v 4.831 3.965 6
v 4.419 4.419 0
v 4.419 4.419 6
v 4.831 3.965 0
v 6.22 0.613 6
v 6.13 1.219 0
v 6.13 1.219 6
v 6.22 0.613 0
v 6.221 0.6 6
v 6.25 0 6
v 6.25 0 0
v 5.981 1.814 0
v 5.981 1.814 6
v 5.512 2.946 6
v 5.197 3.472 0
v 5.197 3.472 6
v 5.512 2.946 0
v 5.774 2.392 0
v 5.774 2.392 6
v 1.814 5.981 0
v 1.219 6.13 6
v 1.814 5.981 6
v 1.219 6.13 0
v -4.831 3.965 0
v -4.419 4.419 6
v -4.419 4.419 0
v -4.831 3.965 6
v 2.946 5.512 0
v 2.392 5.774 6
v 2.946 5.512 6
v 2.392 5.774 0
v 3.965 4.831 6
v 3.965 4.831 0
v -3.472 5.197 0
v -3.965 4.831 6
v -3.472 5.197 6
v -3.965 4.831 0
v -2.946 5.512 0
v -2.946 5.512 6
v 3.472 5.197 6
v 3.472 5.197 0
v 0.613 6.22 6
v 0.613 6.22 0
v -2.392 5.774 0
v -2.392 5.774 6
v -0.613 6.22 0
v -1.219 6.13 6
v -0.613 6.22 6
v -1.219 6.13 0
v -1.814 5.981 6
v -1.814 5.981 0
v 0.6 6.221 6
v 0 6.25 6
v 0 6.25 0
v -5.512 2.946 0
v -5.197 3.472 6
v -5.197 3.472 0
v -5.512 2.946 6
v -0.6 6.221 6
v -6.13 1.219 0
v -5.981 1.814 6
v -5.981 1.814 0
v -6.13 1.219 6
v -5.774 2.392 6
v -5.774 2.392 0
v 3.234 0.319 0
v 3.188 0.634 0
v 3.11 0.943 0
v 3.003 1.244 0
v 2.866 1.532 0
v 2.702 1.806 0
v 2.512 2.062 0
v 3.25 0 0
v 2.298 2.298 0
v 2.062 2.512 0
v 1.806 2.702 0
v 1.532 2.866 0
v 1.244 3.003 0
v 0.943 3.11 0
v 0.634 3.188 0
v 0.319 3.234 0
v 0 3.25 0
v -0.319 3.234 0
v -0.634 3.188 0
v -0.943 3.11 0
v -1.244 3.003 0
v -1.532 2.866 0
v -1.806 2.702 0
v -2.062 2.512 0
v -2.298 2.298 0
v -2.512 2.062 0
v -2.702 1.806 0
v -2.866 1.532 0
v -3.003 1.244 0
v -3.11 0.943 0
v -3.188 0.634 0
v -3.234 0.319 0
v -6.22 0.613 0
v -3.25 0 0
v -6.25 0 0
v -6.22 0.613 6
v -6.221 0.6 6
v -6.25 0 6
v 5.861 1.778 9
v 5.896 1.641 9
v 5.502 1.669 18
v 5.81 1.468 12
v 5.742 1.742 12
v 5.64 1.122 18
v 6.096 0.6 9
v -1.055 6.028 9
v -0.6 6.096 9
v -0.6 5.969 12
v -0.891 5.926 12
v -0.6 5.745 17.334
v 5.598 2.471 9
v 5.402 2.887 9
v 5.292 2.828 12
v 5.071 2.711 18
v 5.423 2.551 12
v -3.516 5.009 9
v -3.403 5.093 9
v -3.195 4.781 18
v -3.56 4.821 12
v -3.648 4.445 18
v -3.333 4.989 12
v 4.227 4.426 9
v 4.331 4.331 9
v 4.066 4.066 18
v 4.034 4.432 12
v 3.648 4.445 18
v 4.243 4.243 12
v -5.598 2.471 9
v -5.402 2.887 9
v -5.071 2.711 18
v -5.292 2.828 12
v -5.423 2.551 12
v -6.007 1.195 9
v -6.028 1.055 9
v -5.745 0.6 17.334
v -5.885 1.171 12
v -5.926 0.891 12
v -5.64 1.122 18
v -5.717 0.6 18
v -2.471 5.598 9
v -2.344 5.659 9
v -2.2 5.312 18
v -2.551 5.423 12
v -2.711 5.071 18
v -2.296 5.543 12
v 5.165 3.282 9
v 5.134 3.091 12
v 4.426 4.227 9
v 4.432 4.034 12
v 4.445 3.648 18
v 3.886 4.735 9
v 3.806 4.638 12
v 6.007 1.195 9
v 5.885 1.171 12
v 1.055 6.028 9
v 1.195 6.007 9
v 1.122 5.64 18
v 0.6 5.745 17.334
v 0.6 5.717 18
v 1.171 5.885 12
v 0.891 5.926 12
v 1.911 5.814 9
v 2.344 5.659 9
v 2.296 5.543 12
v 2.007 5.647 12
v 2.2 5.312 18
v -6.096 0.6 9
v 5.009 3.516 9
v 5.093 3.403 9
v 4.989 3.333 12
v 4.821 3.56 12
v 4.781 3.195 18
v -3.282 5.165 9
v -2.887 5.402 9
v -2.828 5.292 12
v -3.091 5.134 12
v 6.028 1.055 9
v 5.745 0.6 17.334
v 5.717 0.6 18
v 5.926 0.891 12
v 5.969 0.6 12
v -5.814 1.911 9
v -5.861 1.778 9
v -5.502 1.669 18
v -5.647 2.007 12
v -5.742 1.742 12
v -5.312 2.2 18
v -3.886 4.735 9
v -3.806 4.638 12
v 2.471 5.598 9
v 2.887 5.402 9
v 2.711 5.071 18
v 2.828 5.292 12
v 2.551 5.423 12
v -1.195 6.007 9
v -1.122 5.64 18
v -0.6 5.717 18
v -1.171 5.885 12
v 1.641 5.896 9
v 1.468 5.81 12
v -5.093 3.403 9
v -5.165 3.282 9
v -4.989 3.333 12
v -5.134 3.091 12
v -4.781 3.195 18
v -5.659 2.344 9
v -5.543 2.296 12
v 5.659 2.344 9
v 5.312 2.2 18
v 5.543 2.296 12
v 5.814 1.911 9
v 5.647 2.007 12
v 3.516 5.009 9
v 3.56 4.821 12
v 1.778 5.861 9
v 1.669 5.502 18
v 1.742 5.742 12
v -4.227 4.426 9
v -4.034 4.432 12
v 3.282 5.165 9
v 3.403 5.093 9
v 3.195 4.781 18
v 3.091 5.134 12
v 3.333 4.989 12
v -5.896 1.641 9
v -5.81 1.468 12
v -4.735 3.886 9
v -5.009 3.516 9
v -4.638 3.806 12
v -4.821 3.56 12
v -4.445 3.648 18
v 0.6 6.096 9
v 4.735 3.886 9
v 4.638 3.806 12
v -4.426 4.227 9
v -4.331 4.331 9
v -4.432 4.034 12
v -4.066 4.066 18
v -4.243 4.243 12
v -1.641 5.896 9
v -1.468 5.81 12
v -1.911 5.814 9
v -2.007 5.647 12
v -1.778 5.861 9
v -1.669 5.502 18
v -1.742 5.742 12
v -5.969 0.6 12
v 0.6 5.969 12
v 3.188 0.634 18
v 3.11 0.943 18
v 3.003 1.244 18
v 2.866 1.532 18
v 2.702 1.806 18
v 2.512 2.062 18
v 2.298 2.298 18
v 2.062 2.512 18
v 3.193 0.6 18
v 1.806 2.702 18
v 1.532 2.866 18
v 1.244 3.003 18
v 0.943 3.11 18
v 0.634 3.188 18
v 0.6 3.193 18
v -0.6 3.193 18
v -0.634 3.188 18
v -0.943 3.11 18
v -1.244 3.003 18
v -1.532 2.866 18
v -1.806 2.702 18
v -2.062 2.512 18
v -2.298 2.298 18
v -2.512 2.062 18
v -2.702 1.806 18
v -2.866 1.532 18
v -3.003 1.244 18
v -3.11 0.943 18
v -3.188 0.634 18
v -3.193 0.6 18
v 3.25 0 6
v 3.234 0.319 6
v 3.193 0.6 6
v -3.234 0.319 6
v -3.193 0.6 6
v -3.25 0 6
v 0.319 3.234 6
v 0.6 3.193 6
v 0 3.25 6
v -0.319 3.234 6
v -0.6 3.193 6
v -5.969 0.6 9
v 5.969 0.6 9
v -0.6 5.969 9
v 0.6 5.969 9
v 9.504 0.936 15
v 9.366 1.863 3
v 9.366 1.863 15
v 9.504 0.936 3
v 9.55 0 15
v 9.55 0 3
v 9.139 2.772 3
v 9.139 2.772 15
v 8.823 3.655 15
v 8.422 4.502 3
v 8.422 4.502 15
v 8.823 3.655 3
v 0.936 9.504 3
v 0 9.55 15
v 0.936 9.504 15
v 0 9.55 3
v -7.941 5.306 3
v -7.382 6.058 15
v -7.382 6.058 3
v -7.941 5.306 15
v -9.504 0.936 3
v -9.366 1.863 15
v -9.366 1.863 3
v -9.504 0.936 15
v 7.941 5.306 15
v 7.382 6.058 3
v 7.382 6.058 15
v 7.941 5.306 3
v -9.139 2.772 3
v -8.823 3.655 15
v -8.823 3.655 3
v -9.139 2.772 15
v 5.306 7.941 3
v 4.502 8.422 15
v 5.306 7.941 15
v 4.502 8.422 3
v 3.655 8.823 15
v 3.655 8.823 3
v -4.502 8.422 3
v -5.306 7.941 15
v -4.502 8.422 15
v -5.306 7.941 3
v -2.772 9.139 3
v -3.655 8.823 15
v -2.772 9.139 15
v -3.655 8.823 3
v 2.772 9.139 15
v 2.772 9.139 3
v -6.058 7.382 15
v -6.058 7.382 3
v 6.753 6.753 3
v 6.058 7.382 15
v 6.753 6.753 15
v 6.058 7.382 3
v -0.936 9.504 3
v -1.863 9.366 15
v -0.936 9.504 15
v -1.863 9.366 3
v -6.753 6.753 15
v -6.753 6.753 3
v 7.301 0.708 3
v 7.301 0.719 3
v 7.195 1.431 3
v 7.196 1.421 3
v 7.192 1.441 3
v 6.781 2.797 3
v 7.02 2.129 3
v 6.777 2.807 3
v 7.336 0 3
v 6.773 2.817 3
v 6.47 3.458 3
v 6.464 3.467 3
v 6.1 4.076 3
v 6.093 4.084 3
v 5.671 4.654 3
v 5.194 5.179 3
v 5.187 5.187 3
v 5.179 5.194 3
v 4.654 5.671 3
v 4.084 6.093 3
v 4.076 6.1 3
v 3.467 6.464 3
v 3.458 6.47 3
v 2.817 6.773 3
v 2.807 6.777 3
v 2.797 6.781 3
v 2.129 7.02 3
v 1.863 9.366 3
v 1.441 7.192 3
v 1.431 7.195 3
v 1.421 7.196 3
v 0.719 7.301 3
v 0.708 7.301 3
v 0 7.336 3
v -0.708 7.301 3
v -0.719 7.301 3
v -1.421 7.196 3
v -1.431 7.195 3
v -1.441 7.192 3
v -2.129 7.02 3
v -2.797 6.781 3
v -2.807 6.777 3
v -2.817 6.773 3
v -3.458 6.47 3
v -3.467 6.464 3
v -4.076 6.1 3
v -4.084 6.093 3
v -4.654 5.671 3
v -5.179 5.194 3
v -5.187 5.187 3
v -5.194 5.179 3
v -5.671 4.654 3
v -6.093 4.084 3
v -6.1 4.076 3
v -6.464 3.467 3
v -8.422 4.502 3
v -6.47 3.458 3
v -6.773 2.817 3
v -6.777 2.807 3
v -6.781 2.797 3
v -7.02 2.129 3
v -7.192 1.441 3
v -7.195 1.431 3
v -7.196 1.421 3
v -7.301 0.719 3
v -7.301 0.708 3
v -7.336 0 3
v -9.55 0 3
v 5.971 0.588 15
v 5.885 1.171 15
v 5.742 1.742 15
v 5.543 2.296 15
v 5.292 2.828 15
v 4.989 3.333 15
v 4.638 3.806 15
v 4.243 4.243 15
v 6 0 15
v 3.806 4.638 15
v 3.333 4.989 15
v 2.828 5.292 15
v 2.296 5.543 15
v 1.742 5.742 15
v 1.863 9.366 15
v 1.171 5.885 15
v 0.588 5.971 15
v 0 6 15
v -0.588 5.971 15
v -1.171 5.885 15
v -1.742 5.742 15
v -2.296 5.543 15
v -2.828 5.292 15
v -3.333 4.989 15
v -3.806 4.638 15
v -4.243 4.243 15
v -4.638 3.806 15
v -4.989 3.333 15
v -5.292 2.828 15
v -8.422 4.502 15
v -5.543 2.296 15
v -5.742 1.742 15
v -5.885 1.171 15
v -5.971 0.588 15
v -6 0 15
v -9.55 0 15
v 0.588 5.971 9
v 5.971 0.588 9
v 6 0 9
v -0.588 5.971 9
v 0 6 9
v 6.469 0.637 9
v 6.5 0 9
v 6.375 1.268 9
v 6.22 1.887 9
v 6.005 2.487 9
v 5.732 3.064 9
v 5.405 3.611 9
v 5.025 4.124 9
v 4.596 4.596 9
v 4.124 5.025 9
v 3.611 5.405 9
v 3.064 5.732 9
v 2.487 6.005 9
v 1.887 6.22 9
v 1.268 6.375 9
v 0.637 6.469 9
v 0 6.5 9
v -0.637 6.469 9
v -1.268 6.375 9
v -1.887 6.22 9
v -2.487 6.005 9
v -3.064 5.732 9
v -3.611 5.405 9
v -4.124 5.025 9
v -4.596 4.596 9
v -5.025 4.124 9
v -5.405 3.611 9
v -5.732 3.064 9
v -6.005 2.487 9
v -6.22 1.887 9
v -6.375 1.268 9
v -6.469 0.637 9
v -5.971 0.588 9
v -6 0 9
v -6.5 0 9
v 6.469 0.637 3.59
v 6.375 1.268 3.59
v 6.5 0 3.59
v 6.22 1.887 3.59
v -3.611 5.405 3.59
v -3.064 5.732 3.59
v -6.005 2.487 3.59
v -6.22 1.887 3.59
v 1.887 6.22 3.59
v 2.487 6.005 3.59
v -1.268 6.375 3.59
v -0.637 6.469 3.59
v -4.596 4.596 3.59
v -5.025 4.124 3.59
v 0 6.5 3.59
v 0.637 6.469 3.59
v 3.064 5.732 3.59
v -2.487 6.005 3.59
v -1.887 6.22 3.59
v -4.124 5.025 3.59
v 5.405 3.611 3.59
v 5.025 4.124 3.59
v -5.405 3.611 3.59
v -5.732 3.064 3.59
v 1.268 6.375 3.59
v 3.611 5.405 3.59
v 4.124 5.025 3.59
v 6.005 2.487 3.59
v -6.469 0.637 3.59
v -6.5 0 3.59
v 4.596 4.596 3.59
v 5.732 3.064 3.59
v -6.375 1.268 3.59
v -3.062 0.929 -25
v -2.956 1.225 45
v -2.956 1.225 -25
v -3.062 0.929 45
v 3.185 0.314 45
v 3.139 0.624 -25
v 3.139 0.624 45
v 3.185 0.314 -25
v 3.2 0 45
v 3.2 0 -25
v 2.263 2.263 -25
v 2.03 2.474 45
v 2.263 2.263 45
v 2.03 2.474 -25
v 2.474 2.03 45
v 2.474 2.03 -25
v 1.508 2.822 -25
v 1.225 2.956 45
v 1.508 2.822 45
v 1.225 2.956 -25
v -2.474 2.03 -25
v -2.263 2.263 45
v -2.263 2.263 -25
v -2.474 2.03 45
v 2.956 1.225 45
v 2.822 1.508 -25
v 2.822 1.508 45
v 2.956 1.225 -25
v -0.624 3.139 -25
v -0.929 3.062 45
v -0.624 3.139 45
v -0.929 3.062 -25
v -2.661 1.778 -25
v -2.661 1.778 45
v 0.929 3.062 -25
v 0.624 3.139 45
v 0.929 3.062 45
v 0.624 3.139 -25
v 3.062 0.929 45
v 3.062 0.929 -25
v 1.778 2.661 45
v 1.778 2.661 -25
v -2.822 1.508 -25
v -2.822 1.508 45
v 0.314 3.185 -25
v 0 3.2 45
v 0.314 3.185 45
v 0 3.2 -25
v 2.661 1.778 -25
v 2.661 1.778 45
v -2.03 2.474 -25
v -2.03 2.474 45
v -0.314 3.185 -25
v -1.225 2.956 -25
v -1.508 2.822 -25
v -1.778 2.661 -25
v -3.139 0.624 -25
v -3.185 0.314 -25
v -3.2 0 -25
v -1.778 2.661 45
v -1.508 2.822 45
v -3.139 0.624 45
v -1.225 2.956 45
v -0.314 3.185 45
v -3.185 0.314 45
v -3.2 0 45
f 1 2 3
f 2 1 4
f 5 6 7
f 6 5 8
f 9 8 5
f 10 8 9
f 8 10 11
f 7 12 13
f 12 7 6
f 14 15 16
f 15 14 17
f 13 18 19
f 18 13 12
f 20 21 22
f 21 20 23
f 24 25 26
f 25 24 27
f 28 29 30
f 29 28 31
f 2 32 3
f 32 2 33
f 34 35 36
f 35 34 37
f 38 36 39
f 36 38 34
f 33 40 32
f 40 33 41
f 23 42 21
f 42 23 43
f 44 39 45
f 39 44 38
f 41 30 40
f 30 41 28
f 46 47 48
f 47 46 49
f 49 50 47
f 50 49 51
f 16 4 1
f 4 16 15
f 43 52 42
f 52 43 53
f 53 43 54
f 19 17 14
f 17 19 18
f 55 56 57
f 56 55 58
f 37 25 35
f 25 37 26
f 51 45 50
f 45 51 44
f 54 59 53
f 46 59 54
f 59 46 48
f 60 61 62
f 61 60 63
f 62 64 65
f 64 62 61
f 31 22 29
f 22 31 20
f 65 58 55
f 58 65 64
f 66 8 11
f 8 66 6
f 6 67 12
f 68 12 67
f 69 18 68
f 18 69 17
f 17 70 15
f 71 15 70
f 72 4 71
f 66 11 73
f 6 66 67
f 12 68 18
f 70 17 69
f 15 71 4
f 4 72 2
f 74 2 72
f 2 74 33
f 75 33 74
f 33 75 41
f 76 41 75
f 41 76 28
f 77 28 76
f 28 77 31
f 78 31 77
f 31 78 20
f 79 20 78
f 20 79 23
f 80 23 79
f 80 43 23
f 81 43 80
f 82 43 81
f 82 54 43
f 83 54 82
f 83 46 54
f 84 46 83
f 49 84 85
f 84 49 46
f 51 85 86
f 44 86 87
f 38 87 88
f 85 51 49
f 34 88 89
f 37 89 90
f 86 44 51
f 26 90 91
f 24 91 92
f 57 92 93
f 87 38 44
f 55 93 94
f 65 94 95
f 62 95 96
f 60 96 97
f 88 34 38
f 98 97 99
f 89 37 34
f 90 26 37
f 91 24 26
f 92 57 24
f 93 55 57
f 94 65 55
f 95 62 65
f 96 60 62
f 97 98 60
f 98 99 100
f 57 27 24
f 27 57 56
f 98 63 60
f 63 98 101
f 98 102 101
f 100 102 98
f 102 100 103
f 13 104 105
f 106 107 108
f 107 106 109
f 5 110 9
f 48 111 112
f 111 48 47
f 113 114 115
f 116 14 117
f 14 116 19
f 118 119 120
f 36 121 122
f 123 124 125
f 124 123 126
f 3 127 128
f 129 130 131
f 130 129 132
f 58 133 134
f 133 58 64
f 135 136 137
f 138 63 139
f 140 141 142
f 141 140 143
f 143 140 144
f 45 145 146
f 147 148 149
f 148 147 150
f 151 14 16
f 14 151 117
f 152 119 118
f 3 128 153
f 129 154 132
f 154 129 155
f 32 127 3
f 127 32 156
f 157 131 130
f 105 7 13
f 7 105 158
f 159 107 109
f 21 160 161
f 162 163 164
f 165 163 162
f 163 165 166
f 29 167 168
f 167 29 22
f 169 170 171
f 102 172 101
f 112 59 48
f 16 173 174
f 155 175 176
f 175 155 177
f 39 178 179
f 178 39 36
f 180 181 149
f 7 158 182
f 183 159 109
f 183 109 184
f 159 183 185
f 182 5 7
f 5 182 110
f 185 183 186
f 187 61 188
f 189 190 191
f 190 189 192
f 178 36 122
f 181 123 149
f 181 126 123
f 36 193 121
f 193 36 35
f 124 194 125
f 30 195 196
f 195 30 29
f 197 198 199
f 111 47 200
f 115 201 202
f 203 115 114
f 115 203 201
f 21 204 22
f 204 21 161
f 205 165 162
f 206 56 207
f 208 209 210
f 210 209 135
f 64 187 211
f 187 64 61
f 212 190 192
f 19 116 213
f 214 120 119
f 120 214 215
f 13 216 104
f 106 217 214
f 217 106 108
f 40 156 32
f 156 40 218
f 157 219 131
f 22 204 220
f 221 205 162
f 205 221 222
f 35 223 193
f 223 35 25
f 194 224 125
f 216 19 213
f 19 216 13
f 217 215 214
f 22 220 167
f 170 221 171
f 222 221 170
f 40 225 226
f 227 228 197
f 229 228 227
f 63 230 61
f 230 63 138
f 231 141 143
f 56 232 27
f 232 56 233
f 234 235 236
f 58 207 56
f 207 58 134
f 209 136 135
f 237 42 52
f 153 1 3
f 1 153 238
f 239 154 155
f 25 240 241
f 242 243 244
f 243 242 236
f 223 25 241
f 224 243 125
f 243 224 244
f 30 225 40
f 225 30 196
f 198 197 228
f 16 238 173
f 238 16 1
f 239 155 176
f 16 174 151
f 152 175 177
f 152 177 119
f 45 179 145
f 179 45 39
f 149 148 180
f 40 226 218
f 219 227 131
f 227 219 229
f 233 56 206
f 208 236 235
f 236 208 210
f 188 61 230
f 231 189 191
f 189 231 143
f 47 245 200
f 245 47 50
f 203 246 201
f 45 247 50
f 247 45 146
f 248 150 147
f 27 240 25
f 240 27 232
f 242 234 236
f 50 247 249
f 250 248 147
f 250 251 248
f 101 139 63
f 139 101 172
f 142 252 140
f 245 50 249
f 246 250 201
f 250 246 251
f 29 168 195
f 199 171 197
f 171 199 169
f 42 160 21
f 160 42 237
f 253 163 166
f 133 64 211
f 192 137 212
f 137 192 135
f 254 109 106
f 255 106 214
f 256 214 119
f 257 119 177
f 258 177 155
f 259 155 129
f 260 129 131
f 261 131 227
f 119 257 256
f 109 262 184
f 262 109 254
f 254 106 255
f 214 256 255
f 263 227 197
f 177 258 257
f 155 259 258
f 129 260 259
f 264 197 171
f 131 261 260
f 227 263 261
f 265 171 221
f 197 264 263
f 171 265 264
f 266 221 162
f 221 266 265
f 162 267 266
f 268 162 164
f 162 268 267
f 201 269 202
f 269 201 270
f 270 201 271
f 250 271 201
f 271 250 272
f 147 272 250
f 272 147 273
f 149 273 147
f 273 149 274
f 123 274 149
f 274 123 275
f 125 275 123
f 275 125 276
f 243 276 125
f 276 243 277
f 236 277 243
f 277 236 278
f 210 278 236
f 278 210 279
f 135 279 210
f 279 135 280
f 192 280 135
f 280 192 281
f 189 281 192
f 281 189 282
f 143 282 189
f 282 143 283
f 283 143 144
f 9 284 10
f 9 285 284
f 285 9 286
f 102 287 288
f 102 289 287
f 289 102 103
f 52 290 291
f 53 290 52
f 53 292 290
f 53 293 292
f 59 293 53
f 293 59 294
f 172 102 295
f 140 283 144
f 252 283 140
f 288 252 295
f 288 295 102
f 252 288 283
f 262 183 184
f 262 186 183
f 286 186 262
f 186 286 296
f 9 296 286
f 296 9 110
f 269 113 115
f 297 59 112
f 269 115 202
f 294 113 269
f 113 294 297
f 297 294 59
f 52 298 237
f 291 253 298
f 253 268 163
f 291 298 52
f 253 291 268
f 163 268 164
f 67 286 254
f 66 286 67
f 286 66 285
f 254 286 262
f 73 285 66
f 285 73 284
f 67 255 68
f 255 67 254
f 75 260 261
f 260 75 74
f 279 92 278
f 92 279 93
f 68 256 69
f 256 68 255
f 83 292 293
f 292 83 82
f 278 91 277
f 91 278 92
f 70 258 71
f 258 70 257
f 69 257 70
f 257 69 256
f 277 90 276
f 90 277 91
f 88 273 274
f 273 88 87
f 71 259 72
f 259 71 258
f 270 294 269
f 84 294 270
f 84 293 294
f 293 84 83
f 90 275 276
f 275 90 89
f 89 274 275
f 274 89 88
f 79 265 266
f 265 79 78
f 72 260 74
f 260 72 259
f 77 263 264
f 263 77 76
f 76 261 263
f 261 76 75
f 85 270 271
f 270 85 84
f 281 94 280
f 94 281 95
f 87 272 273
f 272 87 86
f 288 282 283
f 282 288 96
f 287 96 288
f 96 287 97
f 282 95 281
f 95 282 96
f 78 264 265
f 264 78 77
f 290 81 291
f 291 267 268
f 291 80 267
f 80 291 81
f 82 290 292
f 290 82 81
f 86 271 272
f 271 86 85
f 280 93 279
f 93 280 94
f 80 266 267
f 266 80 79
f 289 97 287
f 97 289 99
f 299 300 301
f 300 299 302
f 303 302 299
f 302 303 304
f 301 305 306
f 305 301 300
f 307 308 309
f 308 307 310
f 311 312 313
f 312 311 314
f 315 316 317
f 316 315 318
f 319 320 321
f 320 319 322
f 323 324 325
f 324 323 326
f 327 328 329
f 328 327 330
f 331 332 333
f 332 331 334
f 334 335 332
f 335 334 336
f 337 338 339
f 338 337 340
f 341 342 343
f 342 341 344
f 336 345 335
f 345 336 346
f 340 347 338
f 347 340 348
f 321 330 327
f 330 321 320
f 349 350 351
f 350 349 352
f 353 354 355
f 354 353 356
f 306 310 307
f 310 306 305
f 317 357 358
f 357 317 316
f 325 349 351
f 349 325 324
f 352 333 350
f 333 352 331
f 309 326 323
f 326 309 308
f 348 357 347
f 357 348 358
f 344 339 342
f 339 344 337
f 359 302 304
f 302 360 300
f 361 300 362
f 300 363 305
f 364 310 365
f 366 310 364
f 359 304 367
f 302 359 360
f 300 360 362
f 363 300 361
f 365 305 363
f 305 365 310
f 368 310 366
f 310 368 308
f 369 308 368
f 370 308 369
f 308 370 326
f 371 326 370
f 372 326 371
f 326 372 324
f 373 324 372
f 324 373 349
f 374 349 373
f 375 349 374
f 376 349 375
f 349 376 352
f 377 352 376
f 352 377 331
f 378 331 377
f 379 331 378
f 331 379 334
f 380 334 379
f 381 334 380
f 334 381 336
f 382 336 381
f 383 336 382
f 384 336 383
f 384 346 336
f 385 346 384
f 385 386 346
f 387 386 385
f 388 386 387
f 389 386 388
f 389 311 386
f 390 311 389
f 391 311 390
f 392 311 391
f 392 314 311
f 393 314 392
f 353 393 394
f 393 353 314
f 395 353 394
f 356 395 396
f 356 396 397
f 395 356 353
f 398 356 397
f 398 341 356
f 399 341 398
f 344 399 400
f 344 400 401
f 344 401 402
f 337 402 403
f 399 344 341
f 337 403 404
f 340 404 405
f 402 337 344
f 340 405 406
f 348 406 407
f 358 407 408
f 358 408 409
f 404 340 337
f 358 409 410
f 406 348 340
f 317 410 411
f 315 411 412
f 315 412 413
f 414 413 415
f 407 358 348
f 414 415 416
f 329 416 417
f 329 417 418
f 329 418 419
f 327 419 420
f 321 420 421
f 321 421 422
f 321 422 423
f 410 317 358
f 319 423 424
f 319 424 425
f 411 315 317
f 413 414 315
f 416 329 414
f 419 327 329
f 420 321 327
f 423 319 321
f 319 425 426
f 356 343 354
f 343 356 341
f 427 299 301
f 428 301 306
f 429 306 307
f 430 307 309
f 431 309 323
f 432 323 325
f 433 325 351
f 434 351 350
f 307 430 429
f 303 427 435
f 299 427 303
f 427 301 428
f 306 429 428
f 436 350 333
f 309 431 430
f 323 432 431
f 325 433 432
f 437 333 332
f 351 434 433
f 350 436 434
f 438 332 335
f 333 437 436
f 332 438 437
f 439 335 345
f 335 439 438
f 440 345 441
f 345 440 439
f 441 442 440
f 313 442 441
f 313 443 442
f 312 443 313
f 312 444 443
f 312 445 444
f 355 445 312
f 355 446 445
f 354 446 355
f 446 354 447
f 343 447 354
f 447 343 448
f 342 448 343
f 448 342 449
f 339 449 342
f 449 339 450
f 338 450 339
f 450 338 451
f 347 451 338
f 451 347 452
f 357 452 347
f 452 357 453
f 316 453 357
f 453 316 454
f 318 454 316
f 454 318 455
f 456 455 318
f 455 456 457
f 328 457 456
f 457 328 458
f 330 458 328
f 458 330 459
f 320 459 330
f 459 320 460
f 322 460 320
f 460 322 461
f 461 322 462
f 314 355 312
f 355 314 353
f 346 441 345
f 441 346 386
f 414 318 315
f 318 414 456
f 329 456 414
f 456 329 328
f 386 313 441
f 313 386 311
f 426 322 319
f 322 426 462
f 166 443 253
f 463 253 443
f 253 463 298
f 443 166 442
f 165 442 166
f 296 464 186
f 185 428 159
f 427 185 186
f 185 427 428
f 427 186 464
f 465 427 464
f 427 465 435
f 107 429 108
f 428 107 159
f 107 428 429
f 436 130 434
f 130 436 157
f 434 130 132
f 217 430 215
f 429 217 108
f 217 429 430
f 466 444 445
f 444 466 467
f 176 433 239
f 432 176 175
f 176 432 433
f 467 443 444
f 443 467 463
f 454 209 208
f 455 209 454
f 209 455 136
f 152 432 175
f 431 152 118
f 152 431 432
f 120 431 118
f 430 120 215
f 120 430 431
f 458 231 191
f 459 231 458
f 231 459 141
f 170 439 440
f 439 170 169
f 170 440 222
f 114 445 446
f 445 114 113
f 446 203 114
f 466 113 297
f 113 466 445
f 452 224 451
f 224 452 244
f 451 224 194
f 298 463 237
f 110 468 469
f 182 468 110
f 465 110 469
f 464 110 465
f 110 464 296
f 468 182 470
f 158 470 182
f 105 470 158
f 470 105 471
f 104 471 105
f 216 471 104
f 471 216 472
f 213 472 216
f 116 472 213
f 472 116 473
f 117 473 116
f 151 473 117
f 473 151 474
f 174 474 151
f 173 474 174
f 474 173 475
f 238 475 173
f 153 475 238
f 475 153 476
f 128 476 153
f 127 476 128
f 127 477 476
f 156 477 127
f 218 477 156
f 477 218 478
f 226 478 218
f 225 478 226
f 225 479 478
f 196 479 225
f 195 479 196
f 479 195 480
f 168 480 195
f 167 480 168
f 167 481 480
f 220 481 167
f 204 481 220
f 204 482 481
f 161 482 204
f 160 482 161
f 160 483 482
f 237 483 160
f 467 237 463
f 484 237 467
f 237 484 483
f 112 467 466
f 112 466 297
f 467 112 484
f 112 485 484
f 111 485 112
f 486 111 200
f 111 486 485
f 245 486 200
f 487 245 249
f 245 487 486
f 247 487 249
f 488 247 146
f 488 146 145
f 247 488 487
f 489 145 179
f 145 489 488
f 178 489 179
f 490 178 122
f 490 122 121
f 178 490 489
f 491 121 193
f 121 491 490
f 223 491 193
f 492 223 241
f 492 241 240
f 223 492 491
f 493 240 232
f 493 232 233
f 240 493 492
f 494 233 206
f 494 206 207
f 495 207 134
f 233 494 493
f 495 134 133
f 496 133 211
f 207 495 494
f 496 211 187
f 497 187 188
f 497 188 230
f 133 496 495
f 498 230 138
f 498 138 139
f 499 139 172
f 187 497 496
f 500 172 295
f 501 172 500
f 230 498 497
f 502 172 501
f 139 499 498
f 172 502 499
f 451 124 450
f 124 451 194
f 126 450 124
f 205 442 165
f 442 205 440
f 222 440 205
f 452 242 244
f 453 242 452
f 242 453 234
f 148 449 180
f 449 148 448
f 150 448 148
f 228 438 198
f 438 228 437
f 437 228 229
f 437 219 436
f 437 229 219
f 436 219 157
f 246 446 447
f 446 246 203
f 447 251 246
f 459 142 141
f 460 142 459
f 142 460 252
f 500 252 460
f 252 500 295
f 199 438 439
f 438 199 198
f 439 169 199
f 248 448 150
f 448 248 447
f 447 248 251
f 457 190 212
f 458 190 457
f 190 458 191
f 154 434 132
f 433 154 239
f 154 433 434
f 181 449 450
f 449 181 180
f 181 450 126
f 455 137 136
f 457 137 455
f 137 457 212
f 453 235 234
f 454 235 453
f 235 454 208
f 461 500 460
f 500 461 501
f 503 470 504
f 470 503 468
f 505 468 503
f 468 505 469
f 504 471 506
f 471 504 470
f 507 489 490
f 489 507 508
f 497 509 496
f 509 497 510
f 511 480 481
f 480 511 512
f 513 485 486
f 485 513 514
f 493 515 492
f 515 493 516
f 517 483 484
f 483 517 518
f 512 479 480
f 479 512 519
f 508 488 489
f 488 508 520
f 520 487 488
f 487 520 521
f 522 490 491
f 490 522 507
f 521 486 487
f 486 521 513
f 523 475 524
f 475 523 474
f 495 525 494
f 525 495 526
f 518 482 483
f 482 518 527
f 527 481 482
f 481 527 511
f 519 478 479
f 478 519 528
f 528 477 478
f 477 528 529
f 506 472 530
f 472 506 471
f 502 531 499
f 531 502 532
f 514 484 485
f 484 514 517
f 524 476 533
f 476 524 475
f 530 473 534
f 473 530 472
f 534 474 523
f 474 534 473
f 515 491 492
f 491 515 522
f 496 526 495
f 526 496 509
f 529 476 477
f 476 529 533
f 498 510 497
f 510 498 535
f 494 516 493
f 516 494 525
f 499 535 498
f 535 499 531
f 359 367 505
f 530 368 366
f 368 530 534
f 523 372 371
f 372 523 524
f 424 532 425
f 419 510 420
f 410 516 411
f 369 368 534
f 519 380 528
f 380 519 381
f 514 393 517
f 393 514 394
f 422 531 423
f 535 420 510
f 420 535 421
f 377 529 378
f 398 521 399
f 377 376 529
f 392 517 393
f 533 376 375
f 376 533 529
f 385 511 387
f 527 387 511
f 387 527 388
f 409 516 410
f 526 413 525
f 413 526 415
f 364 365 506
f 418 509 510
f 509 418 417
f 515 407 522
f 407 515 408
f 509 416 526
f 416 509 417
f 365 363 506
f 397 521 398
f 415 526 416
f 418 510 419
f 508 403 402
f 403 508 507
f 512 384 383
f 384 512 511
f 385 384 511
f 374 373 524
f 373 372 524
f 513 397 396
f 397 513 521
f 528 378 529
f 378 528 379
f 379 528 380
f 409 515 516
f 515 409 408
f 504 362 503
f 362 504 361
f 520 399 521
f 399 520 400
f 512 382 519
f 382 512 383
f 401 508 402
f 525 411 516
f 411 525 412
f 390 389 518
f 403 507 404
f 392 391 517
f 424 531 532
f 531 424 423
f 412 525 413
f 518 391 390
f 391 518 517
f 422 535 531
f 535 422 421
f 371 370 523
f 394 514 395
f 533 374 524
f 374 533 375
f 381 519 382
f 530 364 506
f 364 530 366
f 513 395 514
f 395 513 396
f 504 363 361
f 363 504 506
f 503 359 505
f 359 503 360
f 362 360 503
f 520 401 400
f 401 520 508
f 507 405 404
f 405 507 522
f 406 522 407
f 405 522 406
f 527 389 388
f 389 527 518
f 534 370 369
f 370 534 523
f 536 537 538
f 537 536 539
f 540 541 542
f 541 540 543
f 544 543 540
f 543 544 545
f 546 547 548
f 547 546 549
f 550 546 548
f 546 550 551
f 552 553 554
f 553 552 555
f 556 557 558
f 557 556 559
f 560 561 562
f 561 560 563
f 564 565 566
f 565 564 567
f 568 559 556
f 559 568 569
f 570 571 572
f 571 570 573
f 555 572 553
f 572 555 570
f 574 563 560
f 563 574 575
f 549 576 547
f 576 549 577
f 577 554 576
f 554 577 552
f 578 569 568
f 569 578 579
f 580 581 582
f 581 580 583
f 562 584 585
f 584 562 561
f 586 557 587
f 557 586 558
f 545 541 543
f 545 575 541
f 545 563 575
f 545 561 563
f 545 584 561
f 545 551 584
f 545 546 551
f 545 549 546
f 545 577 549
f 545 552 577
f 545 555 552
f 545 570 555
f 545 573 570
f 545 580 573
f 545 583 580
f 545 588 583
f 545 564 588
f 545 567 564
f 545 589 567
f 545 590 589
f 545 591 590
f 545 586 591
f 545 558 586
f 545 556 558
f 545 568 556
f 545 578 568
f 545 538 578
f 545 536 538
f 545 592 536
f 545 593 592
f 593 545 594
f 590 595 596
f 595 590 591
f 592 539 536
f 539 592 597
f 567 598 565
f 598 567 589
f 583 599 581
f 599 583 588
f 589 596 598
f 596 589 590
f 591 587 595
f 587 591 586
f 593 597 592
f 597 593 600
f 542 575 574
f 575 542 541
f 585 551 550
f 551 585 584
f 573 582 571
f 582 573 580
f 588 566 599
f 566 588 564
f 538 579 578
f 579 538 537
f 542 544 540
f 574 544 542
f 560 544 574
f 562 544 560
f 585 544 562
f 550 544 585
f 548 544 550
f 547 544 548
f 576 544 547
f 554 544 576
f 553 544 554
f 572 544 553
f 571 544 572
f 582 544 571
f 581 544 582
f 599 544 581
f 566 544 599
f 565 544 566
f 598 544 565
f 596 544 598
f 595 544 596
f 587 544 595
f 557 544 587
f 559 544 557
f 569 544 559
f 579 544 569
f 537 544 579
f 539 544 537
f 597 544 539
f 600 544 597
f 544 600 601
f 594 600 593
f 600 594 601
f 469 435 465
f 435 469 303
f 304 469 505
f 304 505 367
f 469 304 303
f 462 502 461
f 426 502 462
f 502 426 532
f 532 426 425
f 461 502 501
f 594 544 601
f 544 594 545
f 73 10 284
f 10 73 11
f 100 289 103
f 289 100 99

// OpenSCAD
// Siphon strainer -- 1/4" tubing adapter, THREADED version
// Collet + collar. Screwing the collar on draws it down the finger taper and
// squeezes the fingers onto the tubing; backing it off releases them.
//
// Layout (radii, all relative to the collet axis):
//
//   collet  z 0..6    solid cylindrical section carrying the external thread
//           z 6..18   four fingers, tapering 12.5 -> 11.5 dia
//   collar  z 0..6    internal thread (crest 12.9) -> clears the fingers
//           z 6..12   squeeze bore (12.0) -> smaller than the finger base
//
// The step between those two bores is what makes it work: the thread has to
// clear the fingers (else the collar binds on the way off), while the squeeze
// bore has to be under the finger diameter (else it never grips).
//
// Travel: 6 mm of thread (3 turns at 2 mm pitch) takes the squeeze bore from
// zero interference at z=12 to 0.25 mm radial at the finger base.

$fn = 64;

// ---- grip class (edit this) ----
tube_bore = 6.50;          // nominal tubing OD is 6.35

// Collet
clamp_length = 18;
thread_len   = 6;
wall         = 3;
slot_width   = 1.2;
num_slots    = 4;
finger_tip_r = 5.75;       // radius at the free end (11.5 dia)

// Thread
thread_pitch = 2.0;
thread_depth = 0.55;
thread_clear = 0.25;      // deliberately loose -- compression, not friction, holds it
crest_flat   = 0.5;
flank_run    = 0.6;

// Collar
collar_wall  = 2.5;

// Derived
core_r      = tube_bore/2 + wall;          // 6.25 -> 12.5 dia
thread_maj  = core_r + thread_depth;       // 6.80 -> 13.6 dia
int_crest   = core_r + thread_clear;       // 6.45 -> 12.9 dia
int_groove  = thread_maj + thread_clear;   // 7.00 -> 14.0 dia
squeeze_r   = core_r - 0.25;               // 6.00 -> 12.0 dia
collar_od   = int_groove + collar_wall;    // 9.50 -> 19.0 dia
turns       = thread_len/thread_pitch;

echo(str("GRIP: bore=", tube_bore, " core=", 2*core_r, " squeeze_bore=", 2*squeeze_r,
         " interference_at_base=", core_r - squeeze_r,
         " | collar_id_thread=", 2*int_crest, " od=", 2*collar_od));

// ---- helical thread -------------------------------------------------------
// Sweeps a trapezoidal ridge along a helix. r0 = root (core) radius,
// r1 = crest radius. Used as a solid for the external thread and as a
// cutter for the internal one (just pass radii offset by the clearance).
module helical_thread(r0, r1, pitch, turns, steps_per_turn = 48) {
    n = ceil(turns*steps_per_turn);
    root = pitch - 2*flank_run - crest_flat;
    prof = [[0, r0], [root, r0], [root+flank_run, r1],
            [root+flank_run+crest_flat, r1], [pitch, r0]];

    pts = [ for (i = [0:n])
              let (a = 360*turns*i/n, dz = pitch*turns*i/n)
                for (k = [0:4])
                  [ prof[k][1]*cos(a), prof[k][1]*sin(a), prof[k][0] + dz ] ];

    side = [ for (i = [0:n-1]) for (k = [0:4])
               let (a = i*5 + k,
                    b = i*5 + (k+1)%5,
                    c = (i+1)*5 + (k+1)%5,
                    d = (i+1)*5 + k)
                 [a, b, c, d] ];

    faces = concat(side,
                   [[4, 3, 2, 1, 0]],
                   [[n*5, n*5+1, n*5+2, n*5+3, n*5+4]]);

    polyhedron(points = pts, faces = faces, convexity = 8);
}

module collet() {
    difference() {
        union() {
            // threaded base section
            cylinder(h = thread_len, r = core_r);
            helical_thread(core_r - 0.15, thread_maj, thread_pitch, turns);
            // finger section
            translate([0,0,thread_len])
                cylinder(h = clamp_length - thread_len, r1 = core_r, r2 = finger_tip_r);
        }

        // tubing bore
        translate([0,0,-0.1])
            cylinder(h = clamp_length + 0.2, r = tube_bore/2);

        // slots, only through the finger section
        for (a = [0:360/num_slots:359])
            rotate([0,0,a])
                translate([0, -slot_width/2, thread_len])
                    cube([core_r + 1, slot_width, clamp_length - thread_len + 0.1]);
    }
}

module collar() {
    difference() {
        cylinder(h = thread_len*2, r = collar_od);

        // squeeze bore, upper half
        translate([0,0,thread_len])
            cylinder(h = thread_len + 0.1, r = squeeze_r);

        // threaded bore, lower half
        cylinder(h = thread_len, r = int_crest);
        helical_thread(int_crest - 0.15, int_groove, thread_pitch, turns);

        // lead-in chamfer
        translate([0,0,-0.01])
            cylinder(h = 0.6, r1 = int_groove + 0.3, r2 = int_crest);
    }
}

// --- cross-section, near half removed, collar partly screwed on ---
zb = 3;

difference() {
    union() {
        color("SteelBlue") collet();
        color("DarkOrange") translate([0,0,zb]) collar();
        color("Silver") translate([0,0,-25]) cylinder(h=70, r=tube_bore/2 - 0.05);
    }
    translate([-50,-50,-70]) cube([100,50,140]);
}
